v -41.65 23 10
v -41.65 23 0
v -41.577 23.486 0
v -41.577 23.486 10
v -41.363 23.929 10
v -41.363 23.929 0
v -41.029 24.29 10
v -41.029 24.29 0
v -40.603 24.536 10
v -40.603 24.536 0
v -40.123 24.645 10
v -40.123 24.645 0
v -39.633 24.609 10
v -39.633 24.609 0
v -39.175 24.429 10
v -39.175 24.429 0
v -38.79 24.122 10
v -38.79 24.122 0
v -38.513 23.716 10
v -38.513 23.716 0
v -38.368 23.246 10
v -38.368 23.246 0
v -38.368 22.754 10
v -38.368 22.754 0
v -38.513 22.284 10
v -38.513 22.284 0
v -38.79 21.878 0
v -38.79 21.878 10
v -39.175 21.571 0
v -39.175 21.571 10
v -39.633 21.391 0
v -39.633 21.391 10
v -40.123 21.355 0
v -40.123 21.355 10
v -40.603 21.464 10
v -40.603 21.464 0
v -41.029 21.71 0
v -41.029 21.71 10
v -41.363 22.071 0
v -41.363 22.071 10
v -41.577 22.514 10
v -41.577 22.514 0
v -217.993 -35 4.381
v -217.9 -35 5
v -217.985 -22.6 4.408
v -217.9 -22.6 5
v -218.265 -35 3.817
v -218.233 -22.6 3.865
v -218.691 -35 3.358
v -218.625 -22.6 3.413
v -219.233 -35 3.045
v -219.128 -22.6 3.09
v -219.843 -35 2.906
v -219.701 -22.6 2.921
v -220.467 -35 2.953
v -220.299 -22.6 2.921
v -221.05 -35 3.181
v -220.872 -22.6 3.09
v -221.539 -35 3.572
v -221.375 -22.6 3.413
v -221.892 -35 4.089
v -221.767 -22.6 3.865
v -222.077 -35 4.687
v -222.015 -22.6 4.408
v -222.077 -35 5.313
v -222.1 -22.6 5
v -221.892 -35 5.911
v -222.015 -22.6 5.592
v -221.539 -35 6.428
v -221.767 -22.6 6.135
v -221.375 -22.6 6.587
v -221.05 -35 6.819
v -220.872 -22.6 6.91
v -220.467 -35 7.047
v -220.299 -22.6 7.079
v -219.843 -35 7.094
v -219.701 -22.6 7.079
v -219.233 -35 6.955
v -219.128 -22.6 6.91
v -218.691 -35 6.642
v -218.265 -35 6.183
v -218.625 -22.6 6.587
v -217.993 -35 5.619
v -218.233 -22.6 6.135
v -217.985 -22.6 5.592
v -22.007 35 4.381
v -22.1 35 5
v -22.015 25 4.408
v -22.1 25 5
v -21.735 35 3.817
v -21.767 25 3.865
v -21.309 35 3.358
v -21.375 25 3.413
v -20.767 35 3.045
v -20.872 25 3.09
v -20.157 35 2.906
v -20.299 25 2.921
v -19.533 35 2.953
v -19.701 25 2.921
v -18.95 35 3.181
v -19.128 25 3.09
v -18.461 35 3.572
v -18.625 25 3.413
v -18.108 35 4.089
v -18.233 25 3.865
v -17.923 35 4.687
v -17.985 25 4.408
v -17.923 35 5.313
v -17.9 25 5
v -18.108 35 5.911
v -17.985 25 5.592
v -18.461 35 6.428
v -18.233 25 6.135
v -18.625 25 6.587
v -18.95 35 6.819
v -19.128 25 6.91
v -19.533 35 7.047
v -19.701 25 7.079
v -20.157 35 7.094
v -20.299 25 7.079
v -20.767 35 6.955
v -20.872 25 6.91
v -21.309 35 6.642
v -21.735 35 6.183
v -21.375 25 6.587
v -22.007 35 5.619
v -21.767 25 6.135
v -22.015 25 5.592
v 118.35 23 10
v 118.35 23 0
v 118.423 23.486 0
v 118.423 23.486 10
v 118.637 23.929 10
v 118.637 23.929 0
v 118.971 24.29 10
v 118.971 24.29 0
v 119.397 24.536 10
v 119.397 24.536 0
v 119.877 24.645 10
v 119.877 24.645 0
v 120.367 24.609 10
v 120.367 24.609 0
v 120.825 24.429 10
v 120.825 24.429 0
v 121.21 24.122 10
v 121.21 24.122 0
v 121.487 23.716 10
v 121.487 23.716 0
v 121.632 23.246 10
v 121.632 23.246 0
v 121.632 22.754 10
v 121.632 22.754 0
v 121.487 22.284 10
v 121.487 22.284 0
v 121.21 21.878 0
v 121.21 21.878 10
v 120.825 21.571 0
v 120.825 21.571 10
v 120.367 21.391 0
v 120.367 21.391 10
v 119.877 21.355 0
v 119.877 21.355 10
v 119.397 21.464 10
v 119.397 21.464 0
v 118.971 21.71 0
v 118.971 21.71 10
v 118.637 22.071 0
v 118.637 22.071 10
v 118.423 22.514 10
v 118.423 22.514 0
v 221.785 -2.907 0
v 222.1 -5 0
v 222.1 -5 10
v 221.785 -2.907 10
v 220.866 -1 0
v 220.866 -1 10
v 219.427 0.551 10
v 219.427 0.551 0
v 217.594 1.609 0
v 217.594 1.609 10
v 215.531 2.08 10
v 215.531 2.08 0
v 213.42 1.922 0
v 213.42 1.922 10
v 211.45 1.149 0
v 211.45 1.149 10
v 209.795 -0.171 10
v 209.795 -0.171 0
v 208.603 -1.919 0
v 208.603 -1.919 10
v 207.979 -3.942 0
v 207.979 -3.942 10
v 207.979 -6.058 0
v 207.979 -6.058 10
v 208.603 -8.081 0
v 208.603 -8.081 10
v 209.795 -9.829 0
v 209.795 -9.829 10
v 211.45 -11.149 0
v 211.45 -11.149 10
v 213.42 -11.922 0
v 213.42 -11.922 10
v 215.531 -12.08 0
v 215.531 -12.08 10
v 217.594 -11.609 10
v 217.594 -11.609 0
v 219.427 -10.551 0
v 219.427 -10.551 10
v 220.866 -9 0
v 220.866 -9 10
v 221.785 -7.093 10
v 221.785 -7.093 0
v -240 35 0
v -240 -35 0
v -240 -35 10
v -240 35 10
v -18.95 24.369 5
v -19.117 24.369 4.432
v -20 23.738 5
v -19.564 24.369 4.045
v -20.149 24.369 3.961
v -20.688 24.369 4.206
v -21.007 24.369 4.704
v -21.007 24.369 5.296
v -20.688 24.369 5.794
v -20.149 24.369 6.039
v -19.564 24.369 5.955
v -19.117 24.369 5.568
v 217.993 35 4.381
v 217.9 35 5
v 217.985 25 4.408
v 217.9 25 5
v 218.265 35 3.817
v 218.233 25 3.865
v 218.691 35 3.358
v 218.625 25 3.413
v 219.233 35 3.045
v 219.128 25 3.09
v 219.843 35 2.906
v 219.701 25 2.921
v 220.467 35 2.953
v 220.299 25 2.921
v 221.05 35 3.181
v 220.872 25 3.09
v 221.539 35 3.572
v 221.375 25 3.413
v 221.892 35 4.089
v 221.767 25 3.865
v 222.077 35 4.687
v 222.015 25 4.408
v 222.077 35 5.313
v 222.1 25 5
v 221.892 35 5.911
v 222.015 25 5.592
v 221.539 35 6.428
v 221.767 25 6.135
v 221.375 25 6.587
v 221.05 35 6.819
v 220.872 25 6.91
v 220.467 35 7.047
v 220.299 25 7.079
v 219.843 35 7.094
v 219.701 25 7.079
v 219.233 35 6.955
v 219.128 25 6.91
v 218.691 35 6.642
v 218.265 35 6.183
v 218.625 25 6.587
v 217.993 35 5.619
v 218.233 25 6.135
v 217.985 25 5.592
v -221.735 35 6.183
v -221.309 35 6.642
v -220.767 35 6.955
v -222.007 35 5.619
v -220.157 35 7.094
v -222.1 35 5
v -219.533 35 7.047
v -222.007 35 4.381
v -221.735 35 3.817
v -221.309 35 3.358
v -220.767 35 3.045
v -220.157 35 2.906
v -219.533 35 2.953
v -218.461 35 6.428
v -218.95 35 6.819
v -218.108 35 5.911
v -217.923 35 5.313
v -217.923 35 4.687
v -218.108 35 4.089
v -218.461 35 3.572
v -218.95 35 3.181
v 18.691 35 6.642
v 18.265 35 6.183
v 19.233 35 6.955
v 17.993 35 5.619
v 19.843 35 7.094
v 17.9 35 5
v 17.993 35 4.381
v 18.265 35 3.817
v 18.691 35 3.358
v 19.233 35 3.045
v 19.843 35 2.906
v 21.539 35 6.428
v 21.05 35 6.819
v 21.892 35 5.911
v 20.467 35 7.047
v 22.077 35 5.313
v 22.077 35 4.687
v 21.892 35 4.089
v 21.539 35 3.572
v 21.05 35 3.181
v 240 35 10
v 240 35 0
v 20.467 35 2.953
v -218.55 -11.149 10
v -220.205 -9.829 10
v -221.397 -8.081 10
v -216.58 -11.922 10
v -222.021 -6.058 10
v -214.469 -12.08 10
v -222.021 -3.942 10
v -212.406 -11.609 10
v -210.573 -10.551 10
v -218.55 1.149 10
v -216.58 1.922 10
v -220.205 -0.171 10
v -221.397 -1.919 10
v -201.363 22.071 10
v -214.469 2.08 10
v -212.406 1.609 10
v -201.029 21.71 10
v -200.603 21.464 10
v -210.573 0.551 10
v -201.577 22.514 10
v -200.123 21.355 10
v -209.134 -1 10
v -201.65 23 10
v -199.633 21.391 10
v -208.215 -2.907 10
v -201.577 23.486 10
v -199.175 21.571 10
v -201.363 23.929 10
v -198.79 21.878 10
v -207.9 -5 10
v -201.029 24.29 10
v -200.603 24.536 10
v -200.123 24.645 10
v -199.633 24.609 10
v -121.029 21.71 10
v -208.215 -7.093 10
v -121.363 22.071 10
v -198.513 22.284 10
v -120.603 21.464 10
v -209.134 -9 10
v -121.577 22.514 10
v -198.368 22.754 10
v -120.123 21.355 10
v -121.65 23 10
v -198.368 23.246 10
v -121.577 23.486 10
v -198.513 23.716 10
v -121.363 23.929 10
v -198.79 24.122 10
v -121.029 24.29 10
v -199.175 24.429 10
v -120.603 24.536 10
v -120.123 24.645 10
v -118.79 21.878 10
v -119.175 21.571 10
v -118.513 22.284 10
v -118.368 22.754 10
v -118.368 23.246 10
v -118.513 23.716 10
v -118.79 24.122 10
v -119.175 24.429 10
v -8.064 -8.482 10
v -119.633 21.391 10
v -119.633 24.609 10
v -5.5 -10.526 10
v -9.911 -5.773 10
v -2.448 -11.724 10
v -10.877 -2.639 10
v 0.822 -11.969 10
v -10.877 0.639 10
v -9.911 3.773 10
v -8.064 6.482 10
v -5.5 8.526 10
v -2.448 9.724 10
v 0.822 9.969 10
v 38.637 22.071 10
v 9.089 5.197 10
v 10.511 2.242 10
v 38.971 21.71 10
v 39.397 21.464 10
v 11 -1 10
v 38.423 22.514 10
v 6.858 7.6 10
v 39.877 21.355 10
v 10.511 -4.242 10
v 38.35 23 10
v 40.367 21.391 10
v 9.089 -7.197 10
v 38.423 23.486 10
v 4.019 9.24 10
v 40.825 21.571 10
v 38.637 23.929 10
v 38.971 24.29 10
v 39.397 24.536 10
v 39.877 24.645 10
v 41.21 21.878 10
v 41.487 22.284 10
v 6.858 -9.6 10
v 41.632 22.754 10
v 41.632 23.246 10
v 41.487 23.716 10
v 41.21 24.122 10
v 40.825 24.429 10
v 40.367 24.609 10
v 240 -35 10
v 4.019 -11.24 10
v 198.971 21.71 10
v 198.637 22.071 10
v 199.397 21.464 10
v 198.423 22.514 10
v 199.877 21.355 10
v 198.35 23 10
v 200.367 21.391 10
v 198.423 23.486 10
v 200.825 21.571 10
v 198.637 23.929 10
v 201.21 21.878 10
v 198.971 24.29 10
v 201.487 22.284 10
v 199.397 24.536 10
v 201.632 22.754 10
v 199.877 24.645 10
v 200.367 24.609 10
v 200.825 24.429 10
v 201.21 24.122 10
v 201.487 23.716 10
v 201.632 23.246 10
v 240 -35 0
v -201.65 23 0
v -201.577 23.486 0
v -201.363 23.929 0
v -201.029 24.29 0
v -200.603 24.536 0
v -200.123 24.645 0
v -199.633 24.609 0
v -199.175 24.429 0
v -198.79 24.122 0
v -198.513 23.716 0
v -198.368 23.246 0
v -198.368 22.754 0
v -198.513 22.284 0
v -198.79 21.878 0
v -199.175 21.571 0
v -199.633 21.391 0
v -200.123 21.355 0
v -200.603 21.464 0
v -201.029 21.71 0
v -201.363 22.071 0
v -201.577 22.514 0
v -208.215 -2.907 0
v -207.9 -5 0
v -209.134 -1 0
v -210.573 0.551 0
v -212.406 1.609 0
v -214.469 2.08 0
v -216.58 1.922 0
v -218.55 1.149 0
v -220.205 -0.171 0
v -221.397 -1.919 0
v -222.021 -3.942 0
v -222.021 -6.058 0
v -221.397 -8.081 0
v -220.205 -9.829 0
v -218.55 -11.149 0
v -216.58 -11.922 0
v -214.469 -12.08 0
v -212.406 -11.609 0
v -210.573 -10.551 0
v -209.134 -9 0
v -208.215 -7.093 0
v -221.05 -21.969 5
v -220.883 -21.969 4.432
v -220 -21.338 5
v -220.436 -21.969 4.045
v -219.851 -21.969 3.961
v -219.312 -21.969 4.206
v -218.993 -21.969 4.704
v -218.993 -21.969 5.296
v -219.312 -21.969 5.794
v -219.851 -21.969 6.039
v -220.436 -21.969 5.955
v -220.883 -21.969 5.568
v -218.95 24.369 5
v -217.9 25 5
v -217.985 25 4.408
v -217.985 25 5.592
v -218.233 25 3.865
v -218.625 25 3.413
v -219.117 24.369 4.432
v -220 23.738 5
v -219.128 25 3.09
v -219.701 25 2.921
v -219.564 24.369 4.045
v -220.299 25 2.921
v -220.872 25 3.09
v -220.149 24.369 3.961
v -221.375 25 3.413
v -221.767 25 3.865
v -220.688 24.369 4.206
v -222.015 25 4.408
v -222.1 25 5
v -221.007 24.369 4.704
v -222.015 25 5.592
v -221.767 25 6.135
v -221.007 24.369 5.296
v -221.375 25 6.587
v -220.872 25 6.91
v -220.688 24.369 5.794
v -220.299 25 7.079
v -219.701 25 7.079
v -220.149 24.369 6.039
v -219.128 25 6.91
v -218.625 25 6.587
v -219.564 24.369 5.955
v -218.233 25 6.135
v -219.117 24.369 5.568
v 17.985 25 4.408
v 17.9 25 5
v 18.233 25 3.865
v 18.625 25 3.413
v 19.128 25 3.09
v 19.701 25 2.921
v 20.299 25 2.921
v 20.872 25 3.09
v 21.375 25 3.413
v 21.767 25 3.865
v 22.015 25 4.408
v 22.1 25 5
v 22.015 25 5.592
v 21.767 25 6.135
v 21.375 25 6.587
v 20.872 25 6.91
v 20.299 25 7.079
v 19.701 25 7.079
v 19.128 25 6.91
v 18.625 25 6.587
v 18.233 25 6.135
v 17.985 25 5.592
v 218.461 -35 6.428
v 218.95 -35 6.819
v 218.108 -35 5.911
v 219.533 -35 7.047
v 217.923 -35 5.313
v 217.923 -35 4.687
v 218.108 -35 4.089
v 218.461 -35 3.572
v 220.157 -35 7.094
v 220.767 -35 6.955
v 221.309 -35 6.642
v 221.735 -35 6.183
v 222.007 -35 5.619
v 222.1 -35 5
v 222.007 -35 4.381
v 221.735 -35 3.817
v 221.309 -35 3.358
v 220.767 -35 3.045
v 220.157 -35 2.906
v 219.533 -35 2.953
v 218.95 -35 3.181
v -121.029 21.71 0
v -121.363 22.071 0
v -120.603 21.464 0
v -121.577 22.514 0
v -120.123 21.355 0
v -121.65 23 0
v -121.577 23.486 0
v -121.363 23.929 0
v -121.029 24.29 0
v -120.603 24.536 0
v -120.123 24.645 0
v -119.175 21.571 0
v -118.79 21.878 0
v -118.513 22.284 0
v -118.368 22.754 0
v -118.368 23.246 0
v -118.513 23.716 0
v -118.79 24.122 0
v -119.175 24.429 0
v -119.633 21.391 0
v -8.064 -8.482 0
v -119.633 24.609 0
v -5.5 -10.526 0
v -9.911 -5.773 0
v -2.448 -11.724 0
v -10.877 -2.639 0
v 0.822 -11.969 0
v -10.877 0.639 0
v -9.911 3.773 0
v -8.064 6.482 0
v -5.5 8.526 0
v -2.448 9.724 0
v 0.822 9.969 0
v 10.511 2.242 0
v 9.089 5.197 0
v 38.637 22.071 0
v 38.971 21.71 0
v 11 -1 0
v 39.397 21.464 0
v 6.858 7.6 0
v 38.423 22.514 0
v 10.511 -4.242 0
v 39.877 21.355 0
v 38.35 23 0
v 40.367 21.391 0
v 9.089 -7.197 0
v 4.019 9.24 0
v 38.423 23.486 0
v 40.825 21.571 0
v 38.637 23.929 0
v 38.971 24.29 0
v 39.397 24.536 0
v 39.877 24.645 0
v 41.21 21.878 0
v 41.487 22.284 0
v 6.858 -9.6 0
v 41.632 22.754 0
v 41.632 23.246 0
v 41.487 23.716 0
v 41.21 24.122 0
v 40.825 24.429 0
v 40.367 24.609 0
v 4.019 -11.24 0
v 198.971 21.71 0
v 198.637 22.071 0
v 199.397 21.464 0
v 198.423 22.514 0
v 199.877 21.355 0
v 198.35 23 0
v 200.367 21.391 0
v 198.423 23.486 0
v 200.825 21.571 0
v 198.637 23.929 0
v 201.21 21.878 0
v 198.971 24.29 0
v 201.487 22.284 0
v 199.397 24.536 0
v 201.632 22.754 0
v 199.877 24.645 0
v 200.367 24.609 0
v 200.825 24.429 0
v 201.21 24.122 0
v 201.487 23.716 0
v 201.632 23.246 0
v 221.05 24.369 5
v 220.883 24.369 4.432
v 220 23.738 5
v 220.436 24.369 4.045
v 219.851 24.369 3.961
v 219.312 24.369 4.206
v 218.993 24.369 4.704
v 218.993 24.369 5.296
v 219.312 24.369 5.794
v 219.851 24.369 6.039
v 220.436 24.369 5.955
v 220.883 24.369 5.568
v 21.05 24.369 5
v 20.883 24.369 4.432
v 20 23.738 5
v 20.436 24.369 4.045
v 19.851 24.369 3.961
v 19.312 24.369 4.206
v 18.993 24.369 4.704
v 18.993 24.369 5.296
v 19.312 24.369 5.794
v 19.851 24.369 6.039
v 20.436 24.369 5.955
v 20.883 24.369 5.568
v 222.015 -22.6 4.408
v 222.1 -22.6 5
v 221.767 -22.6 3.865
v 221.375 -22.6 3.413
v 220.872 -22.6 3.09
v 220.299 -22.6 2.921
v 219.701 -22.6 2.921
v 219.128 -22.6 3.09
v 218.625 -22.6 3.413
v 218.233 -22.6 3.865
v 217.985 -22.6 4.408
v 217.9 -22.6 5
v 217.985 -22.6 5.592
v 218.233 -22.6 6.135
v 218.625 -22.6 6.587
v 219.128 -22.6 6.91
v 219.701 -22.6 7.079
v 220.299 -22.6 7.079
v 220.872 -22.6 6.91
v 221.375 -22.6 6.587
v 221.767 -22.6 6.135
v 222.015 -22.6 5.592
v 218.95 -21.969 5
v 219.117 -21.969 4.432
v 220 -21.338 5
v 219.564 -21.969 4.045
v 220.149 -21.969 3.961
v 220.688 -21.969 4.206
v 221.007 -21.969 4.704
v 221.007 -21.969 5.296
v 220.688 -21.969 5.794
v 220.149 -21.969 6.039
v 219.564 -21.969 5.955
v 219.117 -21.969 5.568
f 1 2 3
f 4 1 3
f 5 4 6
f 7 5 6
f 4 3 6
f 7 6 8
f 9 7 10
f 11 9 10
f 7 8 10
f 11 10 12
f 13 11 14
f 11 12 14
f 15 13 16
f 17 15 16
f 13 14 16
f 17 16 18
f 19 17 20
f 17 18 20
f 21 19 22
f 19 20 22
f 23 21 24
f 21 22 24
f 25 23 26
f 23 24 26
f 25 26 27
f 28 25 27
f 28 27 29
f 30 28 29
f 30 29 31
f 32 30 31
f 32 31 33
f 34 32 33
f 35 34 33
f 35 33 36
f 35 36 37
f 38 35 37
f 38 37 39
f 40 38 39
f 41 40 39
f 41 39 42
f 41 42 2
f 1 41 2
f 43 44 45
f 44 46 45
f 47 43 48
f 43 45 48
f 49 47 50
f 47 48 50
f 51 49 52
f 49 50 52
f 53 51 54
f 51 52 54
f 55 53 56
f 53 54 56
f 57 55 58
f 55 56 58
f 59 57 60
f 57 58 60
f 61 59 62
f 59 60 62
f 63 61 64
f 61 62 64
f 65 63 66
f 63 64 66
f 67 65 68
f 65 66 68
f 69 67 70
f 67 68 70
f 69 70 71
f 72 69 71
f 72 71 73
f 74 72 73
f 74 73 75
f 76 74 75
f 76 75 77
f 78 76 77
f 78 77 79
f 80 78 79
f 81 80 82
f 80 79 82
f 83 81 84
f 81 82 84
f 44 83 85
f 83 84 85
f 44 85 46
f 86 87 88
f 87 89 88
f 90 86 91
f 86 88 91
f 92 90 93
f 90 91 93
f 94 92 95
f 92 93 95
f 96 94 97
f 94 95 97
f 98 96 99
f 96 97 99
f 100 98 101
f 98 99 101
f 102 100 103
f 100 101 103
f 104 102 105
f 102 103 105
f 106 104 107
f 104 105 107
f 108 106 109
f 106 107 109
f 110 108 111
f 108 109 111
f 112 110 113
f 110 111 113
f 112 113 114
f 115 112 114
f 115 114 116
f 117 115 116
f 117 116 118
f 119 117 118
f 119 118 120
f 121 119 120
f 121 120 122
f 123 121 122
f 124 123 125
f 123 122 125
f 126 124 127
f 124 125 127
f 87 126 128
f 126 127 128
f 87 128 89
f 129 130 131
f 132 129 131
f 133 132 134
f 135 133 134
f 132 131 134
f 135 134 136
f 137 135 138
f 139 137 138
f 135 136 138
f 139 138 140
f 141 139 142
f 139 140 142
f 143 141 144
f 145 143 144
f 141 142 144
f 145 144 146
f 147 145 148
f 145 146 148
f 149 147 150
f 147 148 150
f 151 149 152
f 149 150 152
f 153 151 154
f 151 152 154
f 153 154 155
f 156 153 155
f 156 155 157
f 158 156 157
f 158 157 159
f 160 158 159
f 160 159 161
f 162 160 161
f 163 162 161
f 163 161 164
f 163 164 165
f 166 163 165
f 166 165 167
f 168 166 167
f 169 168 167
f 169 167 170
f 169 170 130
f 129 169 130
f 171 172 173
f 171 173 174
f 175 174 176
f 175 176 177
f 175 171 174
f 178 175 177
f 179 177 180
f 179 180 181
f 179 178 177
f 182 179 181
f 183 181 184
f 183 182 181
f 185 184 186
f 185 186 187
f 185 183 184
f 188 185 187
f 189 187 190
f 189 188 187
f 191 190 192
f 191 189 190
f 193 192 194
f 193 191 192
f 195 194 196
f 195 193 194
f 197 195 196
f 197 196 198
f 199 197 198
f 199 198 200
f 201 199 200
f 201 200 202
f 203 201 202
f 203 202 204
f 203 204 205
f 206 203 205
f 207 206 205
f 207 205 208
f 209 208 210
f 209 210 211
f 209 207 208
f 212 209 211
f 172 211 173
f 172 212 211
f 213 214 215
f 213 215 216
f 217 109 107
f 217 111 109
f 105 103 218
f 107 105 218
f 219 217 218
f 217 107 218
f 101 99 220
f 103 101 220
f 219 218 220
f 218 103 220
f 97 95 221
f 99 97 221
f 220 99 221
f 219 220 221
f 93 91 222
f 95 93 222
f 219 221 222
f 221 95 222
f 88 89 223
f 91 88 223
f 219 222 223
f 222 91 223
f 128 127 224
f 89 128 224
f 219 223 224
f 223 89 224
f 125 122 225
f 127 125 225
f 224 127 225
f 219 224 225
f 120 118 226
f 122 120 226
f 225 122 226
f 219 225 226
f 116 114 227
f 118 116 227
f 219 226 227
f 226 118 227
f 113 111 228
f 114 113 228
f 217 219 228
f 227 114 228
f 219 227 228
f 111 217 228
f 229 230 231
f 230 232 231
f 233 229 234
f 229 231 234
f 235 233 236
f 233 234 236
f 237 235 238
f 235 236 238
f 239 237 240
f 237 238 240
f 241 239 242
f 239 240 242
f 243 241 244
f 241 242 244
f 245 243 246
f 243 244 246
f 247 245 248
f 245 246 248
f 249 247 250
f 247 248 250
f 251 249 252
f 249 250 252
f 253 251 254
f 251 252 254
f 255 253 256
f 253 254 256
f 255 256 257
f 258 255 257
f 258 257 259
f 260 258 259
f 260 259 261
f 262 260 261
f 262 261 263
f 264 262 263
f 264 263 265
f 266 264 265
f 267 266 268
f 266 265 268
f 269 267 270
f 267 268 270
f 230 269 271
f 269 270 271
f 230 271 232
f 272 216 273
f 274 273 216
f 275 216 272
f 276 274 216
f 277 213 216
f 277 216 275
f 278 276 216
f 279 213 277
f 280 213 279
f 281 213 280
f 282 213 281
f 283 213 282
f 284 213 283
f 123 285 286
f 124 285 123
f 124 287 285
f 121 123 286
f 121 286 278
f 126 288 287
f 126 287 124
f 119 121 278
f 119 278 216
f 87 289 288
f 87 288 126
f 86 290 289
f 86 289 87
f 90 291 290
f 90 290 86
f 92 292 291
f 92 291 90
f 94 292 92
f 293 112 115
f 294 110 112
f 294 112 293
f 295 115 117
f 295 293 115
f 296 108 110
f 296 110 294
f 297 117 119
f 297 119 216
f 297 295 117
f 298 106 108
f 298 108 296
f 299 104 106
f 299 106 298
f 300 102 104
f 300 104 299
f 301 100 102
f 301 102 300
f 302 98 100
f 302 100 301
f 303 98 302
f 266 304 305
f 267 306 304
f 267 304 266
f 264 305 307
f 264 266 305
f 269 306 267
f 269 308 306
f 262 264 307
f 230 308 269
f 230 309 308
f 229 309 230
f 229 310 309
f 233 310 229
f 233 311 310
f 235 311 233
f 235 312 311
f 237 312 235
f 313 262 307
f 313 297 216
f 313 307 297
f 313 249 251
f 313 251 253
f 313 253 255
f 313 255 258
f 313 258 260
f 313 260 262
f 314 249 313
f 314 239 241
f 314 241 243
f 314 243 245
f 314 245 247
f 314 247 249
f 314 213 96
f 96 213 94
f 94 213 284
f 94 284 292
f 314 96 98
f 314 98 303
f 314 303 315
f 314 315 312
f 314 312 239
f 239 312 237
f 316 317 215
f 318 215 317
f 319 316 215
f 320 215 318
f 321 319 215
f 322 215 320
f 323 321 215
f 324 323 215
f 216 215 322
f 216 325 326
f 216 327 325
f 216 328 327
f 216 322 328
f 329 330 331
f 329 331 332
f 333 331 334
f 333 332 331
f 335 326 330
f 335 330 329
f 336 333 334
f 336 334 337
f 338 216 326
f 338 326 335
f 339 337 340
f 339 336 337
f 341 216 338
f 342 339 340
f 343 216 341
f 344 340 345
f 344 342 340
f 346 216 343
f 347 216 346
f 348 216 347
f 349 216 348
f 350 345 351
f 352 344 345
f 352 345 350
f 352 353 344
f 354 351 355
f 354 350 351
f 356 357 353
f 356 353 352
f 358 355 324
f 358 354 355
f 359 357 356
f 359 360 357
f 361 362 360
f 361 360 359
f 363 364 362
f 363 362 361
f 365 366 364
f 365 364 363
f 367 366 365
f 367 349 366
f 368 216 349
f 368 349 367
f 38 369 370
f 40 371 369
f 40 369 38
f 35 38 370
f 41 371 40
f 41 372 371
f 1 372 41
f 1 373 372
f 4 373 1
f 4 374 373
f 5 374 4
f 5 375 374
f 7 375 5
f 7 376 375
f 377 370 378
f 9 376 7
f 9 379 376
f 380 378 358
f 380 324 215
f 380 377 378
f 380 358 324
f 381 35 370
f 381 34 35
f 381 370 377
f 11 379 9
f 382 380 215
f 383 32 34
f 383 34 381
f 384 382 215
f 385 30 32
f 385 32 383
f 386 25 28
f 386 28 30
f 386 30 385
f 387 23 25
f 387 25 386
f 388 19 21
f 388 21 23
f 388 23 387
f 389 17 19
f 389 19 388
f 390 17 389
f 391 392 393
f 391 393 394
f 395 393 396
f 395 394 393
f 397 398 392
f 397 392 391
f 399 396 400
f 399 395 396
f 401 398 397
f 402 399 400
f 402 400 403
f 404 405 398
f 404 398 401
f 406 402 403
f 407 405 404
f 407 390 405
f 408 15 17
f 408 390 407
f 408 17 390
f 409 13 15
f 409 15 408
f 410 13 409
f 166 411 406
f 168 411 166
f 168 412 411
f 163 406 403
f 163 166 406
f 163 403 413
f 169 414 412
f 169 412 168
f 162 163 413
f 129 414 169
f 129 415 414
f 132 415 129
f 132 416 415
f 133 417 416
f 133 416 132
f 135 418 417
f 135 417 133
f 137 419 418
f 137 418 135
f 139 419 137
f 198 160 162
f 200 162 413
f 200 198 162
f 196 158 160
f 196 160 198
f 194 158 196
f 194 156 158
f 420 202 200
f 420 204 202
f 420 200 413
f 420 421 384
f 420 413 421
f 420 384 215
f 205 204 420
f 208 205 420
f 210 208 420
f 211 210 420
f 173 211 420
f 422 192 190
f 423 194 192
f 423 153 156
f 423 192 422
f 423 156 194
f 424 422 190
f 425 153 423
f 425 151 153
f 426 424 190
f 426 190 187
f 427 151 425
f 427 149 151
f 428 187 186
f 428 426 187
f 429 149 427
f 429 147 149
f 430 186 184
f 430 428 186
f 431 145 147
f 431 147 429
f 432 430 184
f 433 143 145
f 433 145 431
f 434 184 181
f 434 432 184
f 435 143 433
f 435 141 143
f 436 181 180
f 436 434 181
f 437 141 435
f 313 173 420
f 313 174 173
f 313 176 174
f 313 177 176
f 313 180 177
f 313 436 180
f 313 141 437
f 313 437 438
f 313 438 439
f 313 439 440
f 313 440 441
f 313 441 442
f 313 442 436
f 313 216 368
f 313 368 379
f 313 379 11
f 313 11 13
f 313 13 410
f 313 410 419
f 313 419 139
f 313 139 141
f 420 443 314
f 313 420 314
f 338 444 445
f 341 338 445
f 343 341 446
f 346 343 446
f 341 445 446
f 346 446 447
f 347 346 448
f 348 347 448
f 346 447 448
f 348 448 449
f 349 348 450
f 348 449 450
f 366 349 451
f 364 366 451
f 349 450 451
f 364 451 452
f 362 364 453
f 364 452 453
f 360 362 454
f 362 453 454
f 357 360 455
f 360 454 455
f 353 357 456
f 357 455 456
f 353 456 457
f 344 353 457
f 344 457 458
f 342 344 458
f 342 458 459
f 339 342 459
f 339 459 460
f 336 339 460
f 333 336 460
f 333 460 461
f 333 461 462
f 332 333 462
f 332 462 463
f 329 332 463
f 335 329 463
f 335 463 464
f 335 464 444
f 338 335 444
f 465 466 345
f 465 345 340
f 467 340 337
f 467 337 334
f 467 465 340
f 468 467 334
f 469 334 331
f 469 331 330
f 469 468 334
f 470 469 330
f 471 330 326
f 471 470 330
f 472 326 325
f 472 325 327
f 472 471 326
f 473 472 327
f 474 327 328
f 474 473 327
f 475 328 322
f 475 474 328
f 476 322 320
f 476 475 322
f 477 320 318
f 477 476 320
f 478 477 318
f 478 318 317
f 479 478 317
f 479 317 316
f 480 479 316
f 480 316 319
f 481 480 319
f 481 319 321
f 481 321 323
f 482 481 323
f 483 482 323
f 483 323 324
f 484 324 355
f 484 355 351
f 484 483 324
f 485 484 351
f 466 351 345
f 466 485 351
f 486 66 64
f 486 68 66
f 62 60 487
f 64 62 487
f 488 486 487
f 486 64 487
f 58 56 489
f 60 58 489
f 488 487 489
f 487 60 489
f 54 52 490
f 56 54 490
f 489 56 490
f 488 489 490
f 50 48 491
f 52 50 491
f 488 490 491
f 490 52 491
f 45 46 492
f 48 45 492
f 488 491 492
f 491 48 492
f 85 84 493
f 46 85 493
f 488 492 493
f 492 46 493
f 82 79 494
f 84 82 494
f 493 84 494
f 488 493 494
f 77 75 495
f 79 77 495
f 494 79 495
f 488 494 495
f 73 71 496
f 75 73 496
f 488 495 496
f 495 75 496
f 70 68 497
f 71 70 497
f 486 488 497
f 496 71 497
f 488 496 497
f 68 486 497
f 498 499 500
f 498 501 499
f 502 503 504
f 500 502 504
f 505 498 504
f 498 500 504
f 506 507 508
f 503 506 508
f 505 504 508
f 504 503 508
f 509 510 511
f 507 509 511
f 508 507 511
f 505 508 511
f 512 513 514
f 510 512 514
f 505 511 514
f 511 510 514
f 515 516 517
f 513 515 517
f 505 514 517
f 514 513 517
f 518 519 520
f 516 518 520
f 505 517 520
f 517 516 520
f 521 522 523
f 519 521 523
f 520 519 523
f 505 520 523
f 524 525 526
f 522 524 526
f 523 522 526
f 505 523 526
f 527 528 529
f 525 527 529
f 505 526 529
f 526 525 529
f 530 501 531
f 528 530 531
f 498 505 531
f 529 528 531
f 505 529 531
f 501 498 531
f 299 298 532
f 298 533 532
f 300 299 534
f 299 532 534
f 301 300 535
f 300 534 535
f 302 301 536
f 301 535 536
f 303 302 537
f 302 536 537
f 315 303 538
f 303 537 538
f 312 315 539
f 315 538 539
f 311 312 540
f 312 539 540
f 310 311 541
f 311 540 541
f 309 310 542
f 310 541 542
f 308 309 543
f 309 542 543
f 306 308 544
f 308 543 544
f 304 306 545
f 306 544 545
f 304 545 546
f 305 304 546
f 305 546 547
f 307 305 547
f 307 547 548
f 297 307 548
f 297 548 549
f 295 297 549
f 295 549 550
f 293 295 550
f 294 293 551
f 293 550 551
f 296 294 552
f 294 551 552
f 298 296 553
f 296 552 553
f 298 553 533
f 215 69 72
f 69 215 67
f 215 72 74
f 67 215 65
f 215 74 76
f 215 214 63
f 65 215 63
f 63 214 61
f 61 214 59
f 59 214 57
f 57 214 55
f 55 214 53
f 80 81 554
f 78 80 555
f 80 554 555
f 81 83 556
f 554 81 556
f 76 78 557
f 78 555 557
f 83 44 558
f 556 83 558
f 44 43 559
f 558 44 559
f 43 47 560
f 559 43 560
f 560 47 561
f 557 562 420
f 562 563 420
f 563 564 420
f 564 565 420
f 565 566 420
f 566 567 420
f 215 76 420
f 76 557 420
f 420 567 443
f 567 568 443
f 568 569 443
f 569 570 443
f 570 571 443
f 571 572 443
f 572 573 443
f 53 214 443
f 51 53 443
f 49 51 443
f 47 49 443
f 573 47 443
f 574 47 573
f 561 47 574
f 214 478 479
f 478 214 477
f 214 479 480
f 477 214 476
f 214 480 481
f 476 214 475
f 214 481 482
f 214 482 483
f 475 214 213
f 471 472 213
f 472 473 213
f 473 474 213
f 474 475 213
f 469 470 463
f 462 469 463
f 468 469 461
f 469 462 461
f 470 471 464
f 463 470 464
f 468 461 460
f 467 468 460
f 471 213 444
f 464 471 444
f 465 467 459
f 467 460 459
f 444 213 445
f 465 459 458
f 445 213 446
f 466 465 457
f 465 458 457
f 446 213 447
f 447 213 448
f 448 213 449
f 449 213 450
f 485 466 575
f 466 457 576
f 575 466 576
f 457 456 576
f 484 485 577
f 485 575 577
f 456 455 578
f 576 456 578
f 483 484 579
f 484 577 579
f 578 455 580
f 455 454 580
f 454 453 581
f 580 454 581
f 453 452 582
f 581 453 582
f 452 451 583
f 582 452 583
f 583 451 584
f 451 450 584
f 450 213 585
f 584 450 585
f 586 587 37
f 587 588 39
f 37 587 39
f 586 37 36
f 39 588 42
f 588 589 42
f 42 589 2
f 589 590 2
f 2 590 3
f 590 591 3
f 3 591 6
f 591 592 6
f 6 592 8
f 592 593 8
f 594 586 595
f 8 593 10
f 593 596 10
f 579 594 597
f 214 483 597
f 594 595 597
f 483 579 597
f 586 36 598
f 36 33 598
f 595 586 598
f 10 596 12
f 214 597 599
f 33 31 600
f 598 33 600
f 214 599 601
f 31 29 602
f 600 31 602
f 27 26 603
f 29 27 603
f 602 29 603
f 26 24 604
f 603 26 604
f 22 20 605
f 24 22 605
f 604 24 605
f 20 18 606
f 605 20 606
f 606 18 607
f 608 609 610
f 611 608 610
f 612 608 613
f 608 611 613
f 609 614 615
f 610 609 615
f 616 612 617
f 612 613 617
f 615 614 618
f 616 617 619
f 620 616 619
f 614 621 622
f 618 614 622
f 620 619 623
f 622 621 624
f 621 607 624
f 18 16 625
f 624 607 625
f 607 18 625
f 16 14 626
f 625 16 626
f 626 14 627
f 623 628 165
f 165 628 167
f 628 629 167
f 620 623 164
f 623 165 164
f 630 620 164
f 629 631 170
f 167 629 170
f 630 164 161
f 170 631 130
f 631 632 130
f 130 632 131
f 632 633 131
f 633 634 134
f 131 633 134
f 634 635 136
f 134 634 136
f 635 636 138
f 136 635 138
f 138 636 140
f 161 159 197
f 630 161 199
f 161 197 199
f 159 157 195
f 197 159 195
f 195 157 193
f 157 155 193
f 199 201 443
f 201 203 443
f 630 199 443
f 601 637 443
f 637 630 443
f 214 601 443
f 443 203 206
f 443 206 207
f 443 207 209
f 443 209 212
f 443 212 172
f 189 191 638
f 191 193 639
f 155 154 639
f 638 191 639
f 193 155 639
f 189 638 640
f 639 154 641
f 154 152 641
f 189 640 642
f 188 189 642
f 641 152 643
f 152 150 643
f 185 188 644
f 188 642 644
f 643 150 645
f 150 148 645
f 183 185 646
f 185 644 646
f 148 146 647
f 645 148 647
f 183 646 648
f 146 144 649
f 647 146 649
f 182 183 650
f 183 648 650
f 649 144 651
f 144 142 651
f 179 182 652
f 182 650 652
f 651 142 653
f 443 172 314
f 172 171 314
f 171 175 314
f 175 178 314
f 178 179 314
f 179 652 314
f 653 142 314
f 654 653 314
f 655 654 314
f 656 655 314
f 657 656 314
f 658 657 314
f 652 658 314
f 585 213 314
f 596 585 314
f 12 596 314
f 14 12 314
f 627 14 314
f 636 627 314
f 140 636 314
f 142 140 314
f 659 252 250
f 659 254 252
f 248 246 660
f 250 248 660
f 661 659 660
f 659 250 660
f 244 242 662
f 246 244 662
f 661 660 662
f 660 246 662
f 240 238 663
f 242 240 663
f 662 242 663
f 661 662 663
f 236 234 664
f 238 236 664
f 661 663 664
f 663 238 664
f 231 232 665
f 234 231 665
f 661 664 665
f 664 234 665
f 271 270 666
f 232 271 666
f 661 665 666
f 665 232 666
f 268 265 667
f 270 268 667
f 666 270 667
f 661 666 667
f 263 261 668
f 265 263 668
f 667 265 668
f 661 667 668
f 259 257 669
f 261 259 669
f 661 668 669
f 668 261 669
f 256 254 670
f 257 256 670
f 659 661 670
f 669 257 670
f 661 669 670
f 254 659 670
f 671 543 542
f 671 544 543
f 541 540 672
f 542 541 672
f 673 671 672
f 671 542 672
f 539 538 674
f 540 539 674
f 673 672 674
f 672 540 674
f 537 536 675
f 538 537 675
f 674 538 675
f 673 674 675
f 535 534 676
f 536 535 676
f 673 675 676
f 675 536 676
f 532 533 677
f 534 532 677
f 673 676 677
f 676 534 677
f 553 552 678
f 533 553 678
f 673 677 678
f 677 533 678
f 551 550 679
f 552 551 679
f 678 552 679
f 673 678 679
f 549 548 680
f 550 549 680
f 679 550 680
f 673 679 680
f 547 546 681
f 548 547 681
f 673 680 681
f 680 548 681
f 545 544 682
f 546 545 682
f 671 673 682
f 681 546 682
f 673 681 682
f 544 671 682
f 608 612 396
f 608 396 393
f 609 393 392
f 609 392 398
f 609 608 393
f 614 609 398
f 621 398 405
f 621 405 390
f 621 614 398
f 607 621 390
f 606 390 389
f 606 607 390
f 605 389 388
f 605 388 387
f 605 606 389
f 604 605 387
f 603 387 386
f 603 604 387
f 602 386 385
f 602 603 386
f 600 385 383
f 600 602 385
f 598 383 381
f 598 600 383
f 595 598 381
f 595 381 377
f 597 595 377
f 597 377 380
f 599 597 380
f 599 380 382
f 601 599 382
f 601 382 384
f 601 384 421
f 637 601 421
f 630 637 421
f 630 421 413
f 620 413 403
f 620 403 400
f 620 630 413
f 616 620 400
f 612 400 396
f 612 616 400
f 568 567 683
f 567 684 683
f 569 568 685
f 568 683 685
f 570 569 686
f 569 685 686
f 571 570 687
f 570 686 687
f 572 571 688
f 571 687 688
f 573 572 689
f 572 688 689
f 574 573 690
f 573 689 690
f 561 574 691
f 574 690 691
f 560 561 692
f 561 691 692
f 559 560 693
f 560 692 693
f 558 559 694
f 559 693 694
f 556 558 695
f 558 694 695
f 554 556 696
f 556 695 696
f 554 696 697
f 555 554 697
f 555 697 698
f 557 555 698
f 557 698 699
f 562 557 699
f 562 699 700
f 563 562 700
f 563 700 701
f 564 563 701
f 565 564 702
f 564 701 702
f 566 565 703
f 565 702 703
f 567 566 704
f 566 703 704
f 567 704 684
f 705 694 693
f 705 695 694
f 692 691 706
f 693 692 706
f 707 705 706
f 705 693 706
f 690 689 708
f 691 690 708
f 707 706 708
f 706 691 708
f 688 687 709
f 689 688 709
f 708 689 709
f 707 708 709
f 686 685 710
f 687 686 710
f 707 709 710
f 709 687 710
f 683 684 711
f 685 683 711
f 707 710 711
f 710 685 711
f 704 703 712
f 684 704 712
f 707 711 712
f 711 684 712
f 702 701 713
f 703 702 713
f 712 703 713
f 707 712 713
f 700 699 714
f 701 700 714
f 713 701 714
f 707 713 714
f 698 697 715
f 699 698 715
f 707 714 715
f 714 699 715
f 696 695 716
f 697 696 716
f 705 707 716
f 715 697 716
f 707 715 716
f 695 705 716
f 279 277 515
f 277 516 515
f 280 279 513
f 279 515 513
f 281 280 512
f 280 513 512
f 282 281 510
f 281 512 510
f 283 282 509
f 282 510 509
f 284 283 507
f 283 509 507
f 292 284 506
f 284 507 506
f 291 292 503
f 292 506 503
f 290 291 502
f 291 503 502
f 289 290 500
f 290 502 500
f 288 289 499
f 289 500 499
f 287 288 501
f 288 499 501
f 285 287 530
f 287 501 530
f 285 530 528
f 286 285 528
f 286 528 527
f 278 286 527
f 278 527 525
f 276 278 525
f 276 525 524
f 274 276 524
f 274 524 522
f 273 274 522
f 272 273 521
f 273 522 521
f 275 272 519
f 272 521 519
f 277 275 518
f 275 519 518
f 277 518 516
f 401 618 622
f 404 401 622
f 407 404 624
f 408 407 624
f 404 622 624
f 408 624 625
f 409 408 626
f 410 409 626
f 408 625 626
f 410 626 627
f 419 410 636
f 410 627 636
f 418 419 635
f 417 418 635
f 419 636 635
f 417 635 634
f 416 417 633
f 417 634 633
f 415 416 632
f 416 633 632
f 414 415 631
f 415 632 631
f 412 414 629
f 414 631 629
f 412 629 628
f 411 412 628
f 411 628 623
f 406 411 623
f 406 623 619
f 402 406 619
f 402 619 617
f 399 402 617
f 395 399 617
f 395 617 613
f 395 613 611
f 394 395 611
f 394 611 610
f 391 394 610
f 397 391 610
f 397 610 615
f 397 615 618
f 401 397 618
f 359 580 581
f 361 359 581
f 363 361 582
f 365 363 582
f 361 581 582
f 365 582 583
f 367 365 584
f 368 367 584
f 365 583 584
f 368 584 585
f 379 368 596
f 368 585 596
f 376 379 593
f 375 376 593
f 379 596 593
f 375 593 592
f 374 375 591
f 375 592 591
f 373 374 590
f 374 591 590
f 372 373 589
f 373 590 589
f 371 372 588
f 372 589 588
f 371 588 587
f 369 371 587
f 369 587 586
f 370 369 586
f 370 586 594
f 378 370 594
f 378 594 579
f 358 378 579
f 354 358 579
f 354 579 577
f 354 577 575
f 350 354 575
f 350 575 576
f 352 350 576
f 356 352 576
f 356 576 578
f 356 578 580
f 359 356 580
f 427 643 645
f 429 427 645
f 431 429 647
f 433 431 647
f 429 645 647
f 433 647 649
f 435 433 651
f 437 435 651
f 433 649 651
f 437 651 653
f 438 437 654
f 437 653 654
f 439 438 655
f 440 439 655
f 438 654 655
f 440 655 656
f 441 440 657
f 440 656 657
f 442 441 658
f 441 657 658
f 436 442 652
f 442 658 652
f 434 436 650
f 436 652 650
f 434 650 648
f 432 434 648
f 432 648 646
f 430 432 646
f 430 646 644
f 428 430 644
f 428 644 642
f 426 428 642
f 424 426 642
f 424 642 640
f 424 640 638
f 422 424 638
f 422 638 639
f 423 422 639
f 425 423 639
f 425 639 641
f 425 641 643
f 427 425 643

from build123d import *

# Parameters (mm, degrees)
SKETCH1_W                  = 480
SKETCH1_H                  = 70
SKETCH1_R                  = 11
SKETCH1_R_2                = 7.1
BOSS_EXTRUDE1_DEPTH        = 10
M5_TAPPED_HOLE1_D          = 4.2
M5_TAPPED_HOLE1_DEPTH      = 10
M5_TAPPED_HOLE1_TIP        = 1.2618073
M5_TAPPED_HOLE2_D          = 4.2
M5_TAPPED_HOLE2_DEPTH      = 12.4
M5_TAPPED_HOLE2_TIP        = 1.2618073
F_3_3_3_3_DIAMETER_HOLE1_D = 3.3


with BuildPart() as part:
    # Sketch1 → Boss-Extrude1 (new body)
    with BuildSketch(Plane.XY):
        Rectangle(SKETCH1_W, SKETCH1_H)
        with Locations((0, -1)):
            Circle(SKETCH1_R, mode=Mode.SUBTRACT)
        with Locations((-215, -5)):
            Circle(SKETCH1_R_2, mode=Mode.SUBTRACT)
        with Locations((215, -5)):
            Circle(SKETCH1_R_2, mode=Mode.SUBTRACT)
    extrude(amount=BOSS_EXTRUDE1_DEPTH)

    # M5 Tapped Hole1
    with Locations(Plane(origin=(0, 35, 0), x_dir=(1, 0, 0), z_dir=(0, 1, 0))):
        with Locations((220, -5), (-220, -5), (-20, -5), (20, -5)):
            Hole(M5_TAPPED_HOLE1_D / 2, depth=M5_TAPPED_HOLE1_DEPTH)
            with Locations((0, 0, -(M5_TAPPED_HOLE1_DEPTH + M5_TAPPED_HOLE1_TIP / 2))):  # 118° drill point
                Cone(0, M5_TAPPED_HOLE1_D / 2, M5_TAPPED_HOLE1_TIP, mode=Mode.SUBTRACT)

    # M5 Tapped Hole2
    with Locations(Plane(origin=(0, -35, 0), x_dir=(-1, 0, 0), z_dir=(0, -1, 0))):
        with Locations((-220, -5), (220, -5)):
            Hole(M5_TAPPED_HOLE2_D / 2, depth=M5_TAPPED_HOLE2_DEPTH)
            with Locations((0, 0, -(M5_TAPPED_HOLE2_DEPTH + M5_TAPPED_HOLE2_TIP / 2))):  # 118° drill point
                Cone(0, M5_TAPPED_HOLE2_D / 2, M5_TAPPED_HOLE2_TIP, mode=Mode.SUBTRACT)

    # Ø3.3 (3.3) Diameter Hole1 (through all)
    with Locations(Plane.XY.offset(10)):
        with Locations((-200, 23), (-120, 23), (-40, 23), (40, 23), (120, 23), (200, 23)):
            Hole(F_3_3_3_3_DIAMETER_HOLE1_D / 2)


solid = part.part
